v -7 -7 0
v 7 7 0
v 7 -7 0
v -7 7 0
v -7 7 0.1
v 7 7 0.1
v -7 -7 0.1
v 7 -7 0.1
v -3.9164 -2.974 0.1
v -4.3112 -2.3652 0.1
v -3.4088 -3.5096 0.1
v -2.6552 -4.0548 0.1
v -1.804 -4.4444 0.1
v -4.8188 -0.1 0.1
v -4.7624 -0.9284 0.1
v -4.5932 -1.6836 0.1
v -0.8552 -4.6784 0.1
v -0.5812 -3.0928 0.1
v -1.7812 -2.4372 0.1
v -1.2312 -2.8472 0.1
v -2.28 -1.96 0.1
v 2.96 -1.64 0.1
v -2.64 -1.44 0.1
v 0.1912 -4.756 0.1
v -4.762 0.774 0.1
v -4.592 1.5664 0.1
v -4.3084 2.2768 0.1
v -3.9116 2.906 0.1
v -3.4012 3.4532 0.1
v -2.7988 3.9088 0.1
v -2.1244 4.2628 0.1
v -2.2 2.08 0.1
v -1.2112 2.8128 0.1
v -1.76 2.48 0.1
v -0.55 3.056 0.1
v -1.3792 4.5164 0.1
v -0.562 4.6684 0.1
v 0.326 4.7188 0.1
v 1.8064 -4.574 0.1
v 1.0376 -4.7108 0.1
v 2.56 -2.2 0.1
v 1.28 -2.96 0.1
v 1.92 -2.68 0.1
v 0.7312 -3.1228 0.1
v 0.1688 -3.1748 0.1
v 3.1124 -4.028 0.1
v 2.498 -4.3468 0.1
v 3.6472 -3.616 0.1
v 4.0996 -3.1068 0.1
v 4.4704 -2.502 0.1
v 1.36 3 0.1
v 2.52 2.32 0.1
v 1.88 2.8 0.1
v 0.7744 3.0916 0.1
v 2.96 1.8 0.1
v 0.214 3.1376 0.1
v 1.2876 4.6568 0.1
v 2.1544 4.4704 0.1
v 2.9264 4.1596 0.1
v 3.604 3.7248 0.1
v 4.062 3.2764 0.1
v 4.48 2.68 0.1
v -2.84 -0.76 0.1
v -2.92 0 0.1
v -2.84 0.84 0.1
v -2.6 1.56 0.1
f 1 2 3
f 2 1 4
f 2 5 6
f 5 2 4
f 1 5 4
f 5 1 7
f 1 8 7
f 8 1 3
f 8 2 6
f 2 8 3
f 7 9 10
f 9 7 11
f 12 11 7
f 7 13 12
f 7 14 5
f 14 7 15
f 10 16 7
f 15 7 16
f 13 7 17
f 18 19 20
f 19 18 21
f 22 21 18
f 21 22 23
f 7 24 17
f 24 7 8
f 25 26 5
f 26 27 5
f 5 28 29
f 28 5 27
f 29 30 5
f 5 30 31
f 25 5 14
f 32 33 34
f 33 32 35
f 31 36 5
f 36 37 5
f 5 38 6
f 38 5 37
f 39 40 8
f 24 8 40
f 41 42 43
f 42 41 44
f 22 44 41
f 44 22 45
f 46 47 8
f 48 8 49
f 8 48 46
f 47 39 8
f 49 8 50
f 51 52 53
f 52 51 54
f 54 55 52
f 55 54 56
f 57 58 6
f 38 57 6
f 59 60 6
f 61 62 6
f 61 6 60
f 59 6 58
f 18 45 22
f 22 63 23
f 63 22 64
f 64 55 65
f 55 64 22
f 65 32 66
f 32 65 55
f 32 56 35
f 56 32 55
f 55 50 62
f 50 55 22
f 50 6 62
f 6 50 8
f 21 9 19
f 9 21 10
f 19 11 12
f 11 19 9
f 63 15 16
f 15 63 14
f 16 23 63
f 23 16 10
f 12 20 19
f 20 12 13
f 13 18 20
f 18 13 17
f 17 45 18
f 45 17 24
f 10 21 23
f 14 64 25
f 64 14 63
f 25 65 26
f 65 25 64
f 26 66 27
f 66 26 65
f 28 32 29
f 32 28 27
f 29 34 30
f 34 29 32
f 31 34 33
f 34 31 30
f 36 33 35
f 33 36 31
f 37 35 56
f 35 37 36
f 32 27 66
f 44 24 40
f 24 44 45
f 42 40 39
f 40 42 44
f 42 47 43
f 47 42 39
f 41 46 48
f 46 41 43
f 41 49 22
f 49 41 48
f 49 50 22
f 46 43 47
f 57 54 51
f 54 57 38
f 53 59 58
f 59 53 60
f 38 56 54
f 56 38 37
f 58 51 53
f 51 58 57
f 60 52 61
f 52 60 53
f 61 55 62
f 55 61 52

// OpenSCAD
// file: ../p/box5-12.scad
use <../lib.scad>
function ldraw_lib__box5_12() = [
// 0 Box with 5 Faces without Any Edges
// 0 Name: box5-12.dat
// 0 Author: Chris Dee [cwdee]
// 0 !LDRAW_ORG Primitive UPDATE 2009-02
// 0 !LICENSE Licensed under CC BY 4.0 : see CAreadme.txt
// 
// 0 BFC CERTIFY CCW
  [0,"BFC","CERTIFY"],
  [0,"BFC","CCW"],
// 
// 0 !HISTORY 2009-09-03 [PTadmin] Official Update 2009-02
// 
// 
// 4 16 1 1 1 1 1 -1 -1 1 -1 -1 1 1
  [4,16,1,1,1,1,1,-1,-1,1,-1,-1,1,1],
// 4 16 -1 0 1 1 0 1 1 1 1 -1 1 1
  [4,16,-1,0,1,1,0,1,1,1,1,-1,1,1],
// 4 16 -1 0 -1 -1 0 1 -1 1 1 -1 1 -1
  [4,16,-1,0,-1,-1,0,1,-1,1,1,-1,1,-1],
// 4 16 1 0 -1 -1 0 -1 -1 1 -1 1 1 -1
  [4,16,1,0,-1,-1,0,-1,-1,1,-1,1,1,-1],
// 4 16 1 0 1 1 0 -1 1 1 -1 1 1 1
  [4,16,1,0,1,1,0,-1,1,1,-1,1,1,1],
// 0
];
module ldraw_lib__box5_12(step=0, col=false, unit=2/5, alt=false, line=0.2, solid=!$preview)
    makepoly(ldraw_lib__box5_12(), step=step, col=col, unit=unit, alt=alt, line=line, solid=solid);
ldraw_lib__box5_12(line=0.2);
// main file
use <../lib.scad>
use <../p/box5-12.scad>
function ldraw_lib__4521703o() = [
// 0 Sticker  1.7 x  1.7 with Dark_Red "C"
// 0 Name: 4521703o.dat
// 0 Author: J.C. Tchang [tchang]
// 0 !LDRAW_ORG Part UPDATE 2011-01
// 0 !LICENSE Licensed under CC BY 4.0 : see CAreadme.txt
// 
// 0 BFC CERTIFY CCW
  [0,"BFC","CERTIFY"],
  [0,"BFC","CCW"],
// 
// 0 !HISTORY 2011-07-25 [PTadmin] Official Update 2011-01
// 
// 
// 1 15 0 -0.25 0 17.5 0 0 0 0.25 0 0 0 17.5 box5-12.dat
  [1,15,0,-0.25,0,17.5,0,0,0,0.25,0,0,0,17.5, ldraw_lib__box5_12()],
// 0 //
// 3 15 -17.5 -0.25 -17.5 -9.791 -0.25 -7.435 -10.778 -0.25 -5.913
  [3,15,-17.5,-0.25,-17.5,-9.791,-0.25,-7.435,-10.778,-0.25,-5.913],
// 3 15 -9.791 -0.25 -7.435 -17.5 -0.25 -17.5 -8.522 -0.25 -8.774
  [3,15,-9.791,-0.25,-7.435,-17.5,-0.25,-17.5,-8.522,-0.25,-8.774],
// 3 15 -6.638 -0.25 -10.137 -8.522 -0.25 -8.774 -17.5 -0.25 -17.5
  [3,15,-6.638,-0.25,-10.137,-8.522,-0.25,-8.774,-17.5,-0.25,-17.5],
// 3 15 -17.5 -0.25 -17.5 -4.51 -0.25 -11.111 -6.638 -0.25 -10.137
  [3,15,-17.5,-0.25,-17.5,-4.51,-0.25,-11.111,-6.638,-0.25,-10.137],
// 4 15 -17.5 -0.25 -17.5 -11.906 -0.25 -2.321 -12.047 -0.25 -0.25 -17.5 -0.25 17.5
  [4,15,-17.5,-0.25,-17.5,-11.906,-0.25,-2.321,-12.047,-0.25,-0.25,-17.5,-0.25,17.5],
// 3 15 -10.778 -0.25 -5.913 -11.483 -0.25 -4.209 -17.5 -0.25 -17.5
  [3,15,-10.778,-0.25,-5.913,-11.483,-0.25,-4.209,-17.5,-0.25,-17.5],
// 3 15 -11.906 -0.25 -2.321 -17.5 -0.25 -17.5 -11.483 -0.25 -4.209
  [3,15,-11.906,-0.25,-2.321,-17.5,-0.25,-17.5,-11.483,-0.25,-4.209],
// 3 15 -4.51 -0.25 -11.111 -17.5 -0.25 -17.5 -2.138 -0.25 -11.696
  [3,15,-4.51,-0.25,-11.111,-17.5,-0.25,-17.5,-2.138,-0.25,-11.696],
// 4 15 -4.453 -0.25 -6.093 -3.078 -0.25 -7.118 -1.453 -0.25 -7.732 -5.7 -0.25 -4.9
  [4,15,-4.453,-0.25,-6.093,-3.078,-0.25,-7.118,-1.453,-0.25,-7.732,-5.7,-0.25,-4.9],
// 4 15 7.4 -0.25 -4.1 -6.6 -0.25 -3.6 -5.7 -0.25 -4.9 -1.453 -0.25 -7.732
  [4,15,7.4,-0.25,-4.1,-6.6,-0.25,-3.6,-5.7,-0.25,-4.9,-1.453,-0.25,-7.732],
// 4 15 0.478 -0.25 -11.89 -2.138 -0.25 -11.696 -17.5 -0.25 -17.5 17.5 -0.25 -17.5
  [4,15,0.478,-0.25,-11.89,-2.138,-0.25,-11.696,-17.5,-0.25,-17.5,17.5,-0.25,-17.5],
// 3 15 -11.905 -0.25 1.935 -11.48 -0.25 3.916 -17.5 -0.25 17.5
  [3,15,-11.905,-0.25,1.935,-11.48,-0.25,3.916,-17.5,-0.25,17.5],
// 3 15 -11.48 -0.25 3.916 -10.771 -0.25 5.692 -17.5 -0.25 17.5
  [3,15,-11.48,-0.25,3.916,-10.771,-0.25,5.692,-17.5,-0.25,17.5],
// 3 15 -17.5 -0.25 17.5 -9.779 -0.25 7.265 -8.503 -0.25 8.633
  [3,15,-17.5,-0.25,17.5,-9.779,-0.25,7.265,-8.503,-0.25,8.633],
// 3 15 -9.779 -0.25 7.265 -17.5 -0.25 17.5 -10.771 -0.25 5.692
  [3,15,-9.779,-0.25,7.265,-17.5,-0.25,17.5,-10.771,-0.25,5.692],
// 3 15 -8.503 -0.25 8.633 -6.997 -0.25 9.772 -17.5 -0.25 17.5
  [3,15,-8.503,-0.25,8.633,-6.997,-0.25,9.772,-17.5,-0.25,17.5],
// 3 15 -17.5 -0.25 17.5 -6.997 -0.25 9.772 -5.311 -0.25 10.657
  [3,15,-17.5,-0.25,17.5,-6.997,-0.25,9.772,-5.311,-0.25,10.657],
// 3 15 -11.905 -0.25 1.935 -17.5 -0.25 17.5 -12.047 -0.25 -0.25
  [3,15,-11.905,-0.25,1.935,-17.5,-0.25,17.5,-12.047,-0.25,-0.25],
// 4 15 -4.4 -0.25 6.2 -5.5 -0.25 5.2 -1.375 -0.25 7.64 -3.028 -0.25 7.032
  [4,15,-4.4,-0.25,6.2,-5.5,-0.25,5.2,-1.375,-0.25,7.64,-3.028,-0.25,7.032],
// 3 15 -5.311 -0.25 10.657 -3.448 -0.25 11.291 -17.5 -0.25 17.5
  [3,15,-5.311,-0.25,10.657,-3.448,-0.25,11.291,-17.5,-0.25,17.5],
// 3 15 -3.448 -0.25 11.291 -1.405 -0.25 11.671 -17.5 -0.25 17.5
  [3,15,-3.448,-0.25,11.291,-1.405,-0.25,11.671,-17.5,-0.25,17.5],
// 4 15 -17.5 -0.25 17.5 -1.405 -0.25 11.671 0.815 -0.25 11.797 17.5 -0.25 17.5
  [4,15,-17.5,-0.25,17.5,-1.405,-0.25,11.671,0.815,-0.25,11.797,17.5,-0.25,17.5],
// 3 15 4.516 -0.25 -11.435 2.594 -0.25 -11.777 17.5 -0.25 -17.5
  [3,15,4.516,-0.25,-11.435,2.594,-0.25,-11.777,17.5,-0.25,-17.5],
// 3 15 0.478 -0.25 -11.89 17.5 -0.25 -17.5 2.594 -0.25 -11.777
  [3,15,0.478,-0.25,-11.89,17.5,-0.25,-17.5,2.594,-0.25,-11.777],
// 4 15 1.828 -0.25 -7.807 3.2 -0.25 -7.4 4.8 -0.25 -6.7 6.4 -0.25 -5.5
  [4,15,1.828,-0.25,-7.807,3.2,-0.25,-7.4,4.8,-0.25,-6.7,6.4,-0.25,-5.5],
// 4 15 0.422 -0.25 -7.937 1.828 -0.25 -7.807 6.4 -0.25 -5.5 7.4 -0.25 -4.1
  [4,15,0.422,-0.25,-7.937,1.828,-0.25,-7.807,6.4,-0.25,-5.5,7.4,-0.25,-4.1],
// 3 15 7.781 -0.25 -10.07 6.245 -0.25 -10.867 17.5 -0.25 -17.5
  [3,15,7.781,-0.25,-10.07,6.245,-0.25,-10.867,17.5,-0.25,-17.5],
// 3 15 9.118 -0.25 -9.04 17.5 -0.25 -17.5 10.249 -0.25 -7.767
  [3,15,9.118,-0.25,-9.04,17.5,-0.25,-17.5,10.249,-0.25,-7.767],
// 3 15 17.5 -0.25 -17.5 9.118 -0.25 -9.04 7.781 -0.25 -10.07
  [3,15,17.5,-0.25,-17.5,9.118,-0.25,-9.04,7.781,-0.25,-10.07],
// 3 15 6.245 -0.25 -10.867 4.516 -0.25 -11.435 17.5 -0.25 -17.5
  [3,15,6.245,-0.25,-10.867,4.516,-0.25,-11.435,17.5,-0.25,-17.5],
// 3 15 10.249 -0.25 -7.767 17.5 -0.25 -17.5 11.176 -0.25 -6.255
  [3,15,10.249,-0.25,-7.767,17.5,-0.25,-17.5,11.176,-0.25,-6.255],
// 4 15 4.7 -0.25 7 3.4 -0.25 7.5 1.936 -0.25 7.729 6.3 -0.25 5.8
  [4,15,4.7,-0.25,7,3.4,-0.25,7.5,1.936,-0.25,7.729,6.3,-0.25,5.8],
// 4 15 7.4 -0.25 4.5 6.3 -0.25 5.8 1.936 -0.25 7.729 0.535 -0.25 7.844
  [4,15,7.4,-0.25,4.5,6.3,-0.25,5.8,1.936,-0.25,7.729,0.535,-0.25,7.844],
// 3 15 3.219 -0.25 11.642 5.386 -0.25 11.176 17.5 -0.25 17.5
  [3,15,3.219,-0.25,11.642,5.386,-0.25,11.176,17.5,-0.25,17.5],
// 3 15 0.815 -0.25 11.797 3.219 -0.25 11.642 17.5 -0.25 17.5
  [3,15,0.815,-0.25,11.797,3.219,-0.25,11.642,17.5,-0.25,17.5],
// 3 15 7.316 -0.25 10.399 9.01 -0.25 9.312 17.5 -0.25 17.5
  [3,15,7.316,-0.25,10.399,9.01,-0.25,9.312,17.5,-0.25,17.5],
// 3 15 10.155 -0.25 8.191 11.2 -0.25 6.7 17.5 -0.25 17.5
  [3,15,10.155,-0.25,8.191,11.2,-0.25,6.7,17.5,-0.25,17.5],
// 3 15 10.155 -0.25 8.191 17.5 -0.25 17.5 9.01 -0.25 9.312
  [3,15,10.155,-0.25,8.191,17.5,-0.25,17.5,9.01,-0.25,9.312],
// 3 15 7.316 -0.25 10.399 17.5 -0.25 17.5 5.386 -0.25 11.176
  [3,15,7.316,-0.25,10.399,17.5,-0.25,17.5,5.386,-0.25,11.176],
// 3 15 -1.453 -0.25 -7.732 0.422 -0.25 -7.937 7.4 -0.25 -4.1
  [3,15,-1.453,-0.25,-7.732,0.422,-0.25,-7.937,7.4,-0.25,-4.1],
// 4 15 -7.1 -0.25 -1.9 -6.6 -0.25 -3.6 7.4 -0.25 -4.1 -7.3 -0.25 0
  [4,15,-7.1,-0.25,-1.9,-6.6,-0.25,-3.6,7.4,-0.25,-4.1,-7.3,-0.25,0],
// 4 15 7.4 -0.25 4.5 -7.1 -0.25 2.1 -7.3 -0.25 0 7.4 -0.25 -4.1
  [4,15,7.4,-0.25,4.5,-7.1,-0.25,2.1,-7.3,-0.25,0,7.4,-0.25,-4.1],
// 4 15 -6.5 -0.25 3.9 -7.1 -0.25 2.1 7.4 -0.25 4.5 -5.5 -0.25 5.2
  [4,15,-6.5,-0.25,3.9,-7.1,-0.25,2.1,7.4,-0.25,4.5,-5.5,-0.25,5.2],
// 4 15 0.535 -0.25 7.844 -1.375 -0.25 7.64 -5.5 -0.25 5.2 7.4 -0.25 4.5
  [4,15,0.535,-0.25,7.844,-1.375,-0.25,7.64,-5.5,-0.25,5.2,7.4,-0.25,4.5],
// 4 15 11.2 -0.25 6.7 7.4 -0.25 4.5 7.4 -0.25 -4.1 11.176 -0.25 -6.255
  [4,15,11.2,-0.25,6.7,7.4,-0.25,4.5,7.4,-0.25,-4.1,11.176,-0.25,-6.255],
// 4 15 11.2 -0.25 6.7 11.176 -0.25 -6.255 17.5 -0.25 -17.5 17.5 -0.25 17.5
  [4,15,11.2,-0.25,6.7,11.176,-0.25,-6.255,17.5,-0.25,-17.5,17.5,-0.25,17.5],
// 0 //
// 4 320 -5.7 -0.25 -4.9 -10.778 -0.25 -5.913 -9.791 -0.25 -7.435 -4.453 -0.25 -6.093
  [4,320,-5.7,-0.25,-4.9,-10.778,-0.25,-5.913,-9.791,-0.25,-7.435,-4.453,-0.25,-6.093],
// 4 320 -4.453 -0.25 -6.093 -9.791 -0.25 -7.435 -8.522 -0.25 -8.774 -6.638 -0.25 -10.137
  [4,320,-4.453,-0.25,-6.093,-9.791,-0.25,-7.435,-8.522,-0.25,-8.774,-6.638,-0.25,-10.137],
// 4 320 -11.906 -0.25 -2.321 -11.483 -0.25 -4.209 -7.1 -0.25 -1.9 -12.047 -0.25 -0.25
  [4,320,-11.906,-0.25,-2.321,-11.483,-0.25,-4.209,-7.1,-0.25,-1.9,-12.047,-0.25,-0.25],
// 4 320 -11.483 -0.25 -4.209 -10.778 -0.25 -5.913 -6.6 -0.25 -3.6 -7.1 -0.25 -1.9
  [4,320,-11.483,-0.25,-4.209,-10.778,-0.25,-5.913,-6.6,-0.25,-3.6,-7.1,-0.25,-1.9],
// 4 320 -3.078 -0.25 -7.118 -4.453 -0.25 -6.093 -6.638 -0.25 -10.137 -4.51 -0.25 -11.111
  [4,320,-3.078,-0.25,-7.118,-4.453,-0.25,-6.093,-6.638,-0.25,-10.137,-4.51,-0.25,-11.111],
// 4 320 -1.453 -0.25 -7.732 -3.078 -0.25 -7.118 -4.51 -0.25 -11.111 -2.138 -0.25 -11.696
  [4,320,-1.453,-0.25,-7.732,-3.078,-0.25,-7.118,-4.51,-0.25,-11.111,-2.138,-0.25,-11.696],
// 4 320 0.422 -0.25 -7.937 -1.453 -0.25 -7.732 -2.138 -0.25 -11.696 0.478 -0.25 -11.89
  [4,320,0.422,-0.25,-7.937,-1.453,-0.25,-7.732,-2.138,-0.25,-11.696,0.478,-0.25,-11.89],
// 3 320 -10.778 -0.25 -5.913 -5.7 -0.25 -4.9 -6.6 -0.25 -3.6
  [3,320,-10.778,-0.25,-5.913,-5.7,-0.25,-4.9,-6.6,-0.25,-3.6],
// 4 320 -12.047 -0.25 -0.25 -7.1 -0.25 -1.9 -7.3 -0.25 0 -11.905 -0.25 1.935
  [4,320,-12.047,-0.25,-0.25,-7.1,-0.25,-1.9,-7.3,-0.25,0,-11.905,-0.25,1.935],
// 4 320 -7.1 -0.25 2.1 -11.48 -0.25 3.916 -11.905 -0.25 1.935 -7.3 -0.25 0
  [4,320,-7.1,-0.25,2.1,-11.48,-0.25,3.916,-11.905,-0.25,1.935,-7.3,-0.25,0],
// 4 320 -6.5 -0.25 3.9 -10.771 -0.25 5.692 -11.48 -0.25 3.916 -7.1 -0.25 2.1
  [4,320,-6.5,-0.25,3.9,-10.771,-0.25,5.692,-11.48,-0.25,3.916,-7.1,-0.25,2.1],
// 4 320 -9.779 -0.25 7.265 -10.771 -0.25 5.692 -5.5 -0.25 5.2 -8.503 -0.25 8.633
  [4,320,-9.779,-0.25,7.265,-10.771,-0.25,5.692,-5.5,-0.25,5.2,-8.503,-0.25,8.633],
// 4 320 -4.4 -0.25 6.2 -6.997 -0.25 9.772 -8.503 -0.25 8.633 -5.5 -0.25 5.2
  [4,320,-4.4,-0.25,6.2,-6.997,-0.25,9.772,-8.503,-0.25,8.633,-5.5,-0.25,5.2],
// 4 320 -3.028 -0.25 7.032 -5.311 -0.25 10.657 -6.997 -0.25 9.772 -4.4 -0.25 6.2
  [4,320,-3.028,-0.25,7.032,-5.311,-0.25,10.657,-6.997,-0.25,9.772,-4.4,-0.25,6.2],
// 4 320 -3.448 -0.25 11.291 -5.311 -0.25 10.657 -3.028 -0.25 7.032 -1.375 -0.25 7.64
  [4,320,-3.448,-0.25,11.291,-5.311,-0.25,10.657,-3.028,-0.25,7.032,-1.375,-0.25,7.64],
// 4 320 -1.375 -0.25 7.64 0.535 -0.25 7.844 -1.405 -0.25 11.671 -3.448 -0.25 11.291
  [4,320,-1.375,-0.25,7.64,0.535,-0.25,7.844,-1.405,-0.25,11.671,-3.448,-0.25,11.291],
// 3 320 -5.5 -0.25 5.2 -10.771 -0.25 5.692 -6.5 -0.25 3.9
  [3,320,-5.5,-0.25,5.2,-10.771,-0.25,5.692,-6.5,-0.25,3.9],
// 4 320 0.422 -0.25 -7.937 0.478 -0.25 -11.89 2.594 -0.25 -11.777 1.828 -0.25 -7.807
  [4,320,0.422,-0.25,-7.937,0.478,-0.25,-11.89,2.594,-0.25,-11.777,1.828,-0.25,-7.807],
// 4 320 1.828 -0.25 -7.807 2.594 -0.25 -11.777 4.516 -0.25 -11.435 3.2 -0.25 -7.4
  [4,320,1.828,-0.25,-7.807,2.594,-0.25,-11.777,4.516,-0.25,-11.435,3.2,-0.25,-7.4],
// 4 320 6.245 -0.25 -10.867 4.8 -0.25 -6.7 3.2 -0.25 -7.4 4.516 -0.25 -11.435
  [4,320,6.245,-0.25,-10.867,4.8,-0.25,-6.7,3.2,-0.25,-7.4,4.516,-0.25,-11.435],
// 4 320 4.8 -0.25 -6.7 7.781 -0.25 -10.07 9.118 -0.25 -9.04 6.4 -0.25 -5.5
  [4,320,4.8,-0.25,-6.7,7.781,-0.25,-10.07,9.118,-0.25,-9.04,6.4,-0.25,-5.5],
// 4 320 6.4 -0.25 -5.5 9.118 -0.25 -9.04 10.249 -0.25 -7.767 7.4 -0.25 -4.1
  [4,320,6.4,-0.25,-5.5,9.118,-0.25,-9.04,10.249,-0.25,-7.767,7.4,-0.25,-4.1],
// 3 320 10.249 -0.25 -7.767 11.176 -0.25 -6.255 7.4 -0.25 -4.1
  [3,320,10.249,-0.25,-7.767,11.176,-0.25,-6.255,7.4,-0.25,-4.1],
// 3 320 7.781 -0.25 -10.07 4.8 -0.25 -6.7 6.245 -0.25 -10.867
  [3,320,7.781,-0.25,-10.07,4.8,-0.25,-6.7,6.245,-0.25,-10.867],
// 4 320 1.936 -0.25 7.729 3.4 -0.25 7.5 3.219 -0.25 11.642 0.815 -0.25 11.797
  [4,320,1.936,-0.25,7.729,3.4,-0.25,7.5,3.219,-0.25,11.642,0.815,-0.25,11.797],
// 4 320 7.316 -0.25 10.399 5.386 -0.25 11.176 4.7 -0.25 7 9.01 -0.25 9.312
  [4,320,7.316,-0.25,10.399,5.386,-0.25,11.176,4.7,-0.25,7,9.01,-0.25,9.312],
// 4 320 0.815 -0.25 11.797 -1.405 -0.25 11.671 0.535 -0.25 7.844 1.936 -0.25 7.729
  [4,320,0.815,-0.25,11.797,-1.405,-0.25,11.671,0.535,-0.25,7.844,1.936,-0.25,7.729],
// 4 320 5.386 -0.25 11.176 3.219 -0.25 11.642 3.4 -0.25 7.5 4.7 -0.25 7
  [4,320,5.386,-0.25,11.176,3.219,-0.25,11.642,3.4,-0.25,7.5,4.7,-0.25,7],
// 4 320 9.01 -0.25 9.312 4.7 -0.25 7 6.3 -0.25 5.8 10.155 -0.25 8.191
  [4,320,9.01,-0.25,9.312,4.7,-0.25,7,6.3,-0.25,5.8,10.155,-0.25,8.191],
// 4 320 7.4 -0.25 4.5 11.2 -0.25 6.7 10.155 -0.25 8.191 6.3 -0.25 5.8
  [4,320,7.4,-0.25,4.5,11.2,-0.25,6.7,10.155,-0.25,8.191,6.3,-0.25,5.8],
// 0 //
];
module ldraw_lib__4521703o(step=0, col=false, unit=2/5, alt=false, line=0.2, solid=!$preview)
    makepoly(ldraw_lib__4521703o(), step=step, col=col, unit=unit, alt=alt, line=line, solid=solid);
ldraw_lib__4521703o(line=0.2);
